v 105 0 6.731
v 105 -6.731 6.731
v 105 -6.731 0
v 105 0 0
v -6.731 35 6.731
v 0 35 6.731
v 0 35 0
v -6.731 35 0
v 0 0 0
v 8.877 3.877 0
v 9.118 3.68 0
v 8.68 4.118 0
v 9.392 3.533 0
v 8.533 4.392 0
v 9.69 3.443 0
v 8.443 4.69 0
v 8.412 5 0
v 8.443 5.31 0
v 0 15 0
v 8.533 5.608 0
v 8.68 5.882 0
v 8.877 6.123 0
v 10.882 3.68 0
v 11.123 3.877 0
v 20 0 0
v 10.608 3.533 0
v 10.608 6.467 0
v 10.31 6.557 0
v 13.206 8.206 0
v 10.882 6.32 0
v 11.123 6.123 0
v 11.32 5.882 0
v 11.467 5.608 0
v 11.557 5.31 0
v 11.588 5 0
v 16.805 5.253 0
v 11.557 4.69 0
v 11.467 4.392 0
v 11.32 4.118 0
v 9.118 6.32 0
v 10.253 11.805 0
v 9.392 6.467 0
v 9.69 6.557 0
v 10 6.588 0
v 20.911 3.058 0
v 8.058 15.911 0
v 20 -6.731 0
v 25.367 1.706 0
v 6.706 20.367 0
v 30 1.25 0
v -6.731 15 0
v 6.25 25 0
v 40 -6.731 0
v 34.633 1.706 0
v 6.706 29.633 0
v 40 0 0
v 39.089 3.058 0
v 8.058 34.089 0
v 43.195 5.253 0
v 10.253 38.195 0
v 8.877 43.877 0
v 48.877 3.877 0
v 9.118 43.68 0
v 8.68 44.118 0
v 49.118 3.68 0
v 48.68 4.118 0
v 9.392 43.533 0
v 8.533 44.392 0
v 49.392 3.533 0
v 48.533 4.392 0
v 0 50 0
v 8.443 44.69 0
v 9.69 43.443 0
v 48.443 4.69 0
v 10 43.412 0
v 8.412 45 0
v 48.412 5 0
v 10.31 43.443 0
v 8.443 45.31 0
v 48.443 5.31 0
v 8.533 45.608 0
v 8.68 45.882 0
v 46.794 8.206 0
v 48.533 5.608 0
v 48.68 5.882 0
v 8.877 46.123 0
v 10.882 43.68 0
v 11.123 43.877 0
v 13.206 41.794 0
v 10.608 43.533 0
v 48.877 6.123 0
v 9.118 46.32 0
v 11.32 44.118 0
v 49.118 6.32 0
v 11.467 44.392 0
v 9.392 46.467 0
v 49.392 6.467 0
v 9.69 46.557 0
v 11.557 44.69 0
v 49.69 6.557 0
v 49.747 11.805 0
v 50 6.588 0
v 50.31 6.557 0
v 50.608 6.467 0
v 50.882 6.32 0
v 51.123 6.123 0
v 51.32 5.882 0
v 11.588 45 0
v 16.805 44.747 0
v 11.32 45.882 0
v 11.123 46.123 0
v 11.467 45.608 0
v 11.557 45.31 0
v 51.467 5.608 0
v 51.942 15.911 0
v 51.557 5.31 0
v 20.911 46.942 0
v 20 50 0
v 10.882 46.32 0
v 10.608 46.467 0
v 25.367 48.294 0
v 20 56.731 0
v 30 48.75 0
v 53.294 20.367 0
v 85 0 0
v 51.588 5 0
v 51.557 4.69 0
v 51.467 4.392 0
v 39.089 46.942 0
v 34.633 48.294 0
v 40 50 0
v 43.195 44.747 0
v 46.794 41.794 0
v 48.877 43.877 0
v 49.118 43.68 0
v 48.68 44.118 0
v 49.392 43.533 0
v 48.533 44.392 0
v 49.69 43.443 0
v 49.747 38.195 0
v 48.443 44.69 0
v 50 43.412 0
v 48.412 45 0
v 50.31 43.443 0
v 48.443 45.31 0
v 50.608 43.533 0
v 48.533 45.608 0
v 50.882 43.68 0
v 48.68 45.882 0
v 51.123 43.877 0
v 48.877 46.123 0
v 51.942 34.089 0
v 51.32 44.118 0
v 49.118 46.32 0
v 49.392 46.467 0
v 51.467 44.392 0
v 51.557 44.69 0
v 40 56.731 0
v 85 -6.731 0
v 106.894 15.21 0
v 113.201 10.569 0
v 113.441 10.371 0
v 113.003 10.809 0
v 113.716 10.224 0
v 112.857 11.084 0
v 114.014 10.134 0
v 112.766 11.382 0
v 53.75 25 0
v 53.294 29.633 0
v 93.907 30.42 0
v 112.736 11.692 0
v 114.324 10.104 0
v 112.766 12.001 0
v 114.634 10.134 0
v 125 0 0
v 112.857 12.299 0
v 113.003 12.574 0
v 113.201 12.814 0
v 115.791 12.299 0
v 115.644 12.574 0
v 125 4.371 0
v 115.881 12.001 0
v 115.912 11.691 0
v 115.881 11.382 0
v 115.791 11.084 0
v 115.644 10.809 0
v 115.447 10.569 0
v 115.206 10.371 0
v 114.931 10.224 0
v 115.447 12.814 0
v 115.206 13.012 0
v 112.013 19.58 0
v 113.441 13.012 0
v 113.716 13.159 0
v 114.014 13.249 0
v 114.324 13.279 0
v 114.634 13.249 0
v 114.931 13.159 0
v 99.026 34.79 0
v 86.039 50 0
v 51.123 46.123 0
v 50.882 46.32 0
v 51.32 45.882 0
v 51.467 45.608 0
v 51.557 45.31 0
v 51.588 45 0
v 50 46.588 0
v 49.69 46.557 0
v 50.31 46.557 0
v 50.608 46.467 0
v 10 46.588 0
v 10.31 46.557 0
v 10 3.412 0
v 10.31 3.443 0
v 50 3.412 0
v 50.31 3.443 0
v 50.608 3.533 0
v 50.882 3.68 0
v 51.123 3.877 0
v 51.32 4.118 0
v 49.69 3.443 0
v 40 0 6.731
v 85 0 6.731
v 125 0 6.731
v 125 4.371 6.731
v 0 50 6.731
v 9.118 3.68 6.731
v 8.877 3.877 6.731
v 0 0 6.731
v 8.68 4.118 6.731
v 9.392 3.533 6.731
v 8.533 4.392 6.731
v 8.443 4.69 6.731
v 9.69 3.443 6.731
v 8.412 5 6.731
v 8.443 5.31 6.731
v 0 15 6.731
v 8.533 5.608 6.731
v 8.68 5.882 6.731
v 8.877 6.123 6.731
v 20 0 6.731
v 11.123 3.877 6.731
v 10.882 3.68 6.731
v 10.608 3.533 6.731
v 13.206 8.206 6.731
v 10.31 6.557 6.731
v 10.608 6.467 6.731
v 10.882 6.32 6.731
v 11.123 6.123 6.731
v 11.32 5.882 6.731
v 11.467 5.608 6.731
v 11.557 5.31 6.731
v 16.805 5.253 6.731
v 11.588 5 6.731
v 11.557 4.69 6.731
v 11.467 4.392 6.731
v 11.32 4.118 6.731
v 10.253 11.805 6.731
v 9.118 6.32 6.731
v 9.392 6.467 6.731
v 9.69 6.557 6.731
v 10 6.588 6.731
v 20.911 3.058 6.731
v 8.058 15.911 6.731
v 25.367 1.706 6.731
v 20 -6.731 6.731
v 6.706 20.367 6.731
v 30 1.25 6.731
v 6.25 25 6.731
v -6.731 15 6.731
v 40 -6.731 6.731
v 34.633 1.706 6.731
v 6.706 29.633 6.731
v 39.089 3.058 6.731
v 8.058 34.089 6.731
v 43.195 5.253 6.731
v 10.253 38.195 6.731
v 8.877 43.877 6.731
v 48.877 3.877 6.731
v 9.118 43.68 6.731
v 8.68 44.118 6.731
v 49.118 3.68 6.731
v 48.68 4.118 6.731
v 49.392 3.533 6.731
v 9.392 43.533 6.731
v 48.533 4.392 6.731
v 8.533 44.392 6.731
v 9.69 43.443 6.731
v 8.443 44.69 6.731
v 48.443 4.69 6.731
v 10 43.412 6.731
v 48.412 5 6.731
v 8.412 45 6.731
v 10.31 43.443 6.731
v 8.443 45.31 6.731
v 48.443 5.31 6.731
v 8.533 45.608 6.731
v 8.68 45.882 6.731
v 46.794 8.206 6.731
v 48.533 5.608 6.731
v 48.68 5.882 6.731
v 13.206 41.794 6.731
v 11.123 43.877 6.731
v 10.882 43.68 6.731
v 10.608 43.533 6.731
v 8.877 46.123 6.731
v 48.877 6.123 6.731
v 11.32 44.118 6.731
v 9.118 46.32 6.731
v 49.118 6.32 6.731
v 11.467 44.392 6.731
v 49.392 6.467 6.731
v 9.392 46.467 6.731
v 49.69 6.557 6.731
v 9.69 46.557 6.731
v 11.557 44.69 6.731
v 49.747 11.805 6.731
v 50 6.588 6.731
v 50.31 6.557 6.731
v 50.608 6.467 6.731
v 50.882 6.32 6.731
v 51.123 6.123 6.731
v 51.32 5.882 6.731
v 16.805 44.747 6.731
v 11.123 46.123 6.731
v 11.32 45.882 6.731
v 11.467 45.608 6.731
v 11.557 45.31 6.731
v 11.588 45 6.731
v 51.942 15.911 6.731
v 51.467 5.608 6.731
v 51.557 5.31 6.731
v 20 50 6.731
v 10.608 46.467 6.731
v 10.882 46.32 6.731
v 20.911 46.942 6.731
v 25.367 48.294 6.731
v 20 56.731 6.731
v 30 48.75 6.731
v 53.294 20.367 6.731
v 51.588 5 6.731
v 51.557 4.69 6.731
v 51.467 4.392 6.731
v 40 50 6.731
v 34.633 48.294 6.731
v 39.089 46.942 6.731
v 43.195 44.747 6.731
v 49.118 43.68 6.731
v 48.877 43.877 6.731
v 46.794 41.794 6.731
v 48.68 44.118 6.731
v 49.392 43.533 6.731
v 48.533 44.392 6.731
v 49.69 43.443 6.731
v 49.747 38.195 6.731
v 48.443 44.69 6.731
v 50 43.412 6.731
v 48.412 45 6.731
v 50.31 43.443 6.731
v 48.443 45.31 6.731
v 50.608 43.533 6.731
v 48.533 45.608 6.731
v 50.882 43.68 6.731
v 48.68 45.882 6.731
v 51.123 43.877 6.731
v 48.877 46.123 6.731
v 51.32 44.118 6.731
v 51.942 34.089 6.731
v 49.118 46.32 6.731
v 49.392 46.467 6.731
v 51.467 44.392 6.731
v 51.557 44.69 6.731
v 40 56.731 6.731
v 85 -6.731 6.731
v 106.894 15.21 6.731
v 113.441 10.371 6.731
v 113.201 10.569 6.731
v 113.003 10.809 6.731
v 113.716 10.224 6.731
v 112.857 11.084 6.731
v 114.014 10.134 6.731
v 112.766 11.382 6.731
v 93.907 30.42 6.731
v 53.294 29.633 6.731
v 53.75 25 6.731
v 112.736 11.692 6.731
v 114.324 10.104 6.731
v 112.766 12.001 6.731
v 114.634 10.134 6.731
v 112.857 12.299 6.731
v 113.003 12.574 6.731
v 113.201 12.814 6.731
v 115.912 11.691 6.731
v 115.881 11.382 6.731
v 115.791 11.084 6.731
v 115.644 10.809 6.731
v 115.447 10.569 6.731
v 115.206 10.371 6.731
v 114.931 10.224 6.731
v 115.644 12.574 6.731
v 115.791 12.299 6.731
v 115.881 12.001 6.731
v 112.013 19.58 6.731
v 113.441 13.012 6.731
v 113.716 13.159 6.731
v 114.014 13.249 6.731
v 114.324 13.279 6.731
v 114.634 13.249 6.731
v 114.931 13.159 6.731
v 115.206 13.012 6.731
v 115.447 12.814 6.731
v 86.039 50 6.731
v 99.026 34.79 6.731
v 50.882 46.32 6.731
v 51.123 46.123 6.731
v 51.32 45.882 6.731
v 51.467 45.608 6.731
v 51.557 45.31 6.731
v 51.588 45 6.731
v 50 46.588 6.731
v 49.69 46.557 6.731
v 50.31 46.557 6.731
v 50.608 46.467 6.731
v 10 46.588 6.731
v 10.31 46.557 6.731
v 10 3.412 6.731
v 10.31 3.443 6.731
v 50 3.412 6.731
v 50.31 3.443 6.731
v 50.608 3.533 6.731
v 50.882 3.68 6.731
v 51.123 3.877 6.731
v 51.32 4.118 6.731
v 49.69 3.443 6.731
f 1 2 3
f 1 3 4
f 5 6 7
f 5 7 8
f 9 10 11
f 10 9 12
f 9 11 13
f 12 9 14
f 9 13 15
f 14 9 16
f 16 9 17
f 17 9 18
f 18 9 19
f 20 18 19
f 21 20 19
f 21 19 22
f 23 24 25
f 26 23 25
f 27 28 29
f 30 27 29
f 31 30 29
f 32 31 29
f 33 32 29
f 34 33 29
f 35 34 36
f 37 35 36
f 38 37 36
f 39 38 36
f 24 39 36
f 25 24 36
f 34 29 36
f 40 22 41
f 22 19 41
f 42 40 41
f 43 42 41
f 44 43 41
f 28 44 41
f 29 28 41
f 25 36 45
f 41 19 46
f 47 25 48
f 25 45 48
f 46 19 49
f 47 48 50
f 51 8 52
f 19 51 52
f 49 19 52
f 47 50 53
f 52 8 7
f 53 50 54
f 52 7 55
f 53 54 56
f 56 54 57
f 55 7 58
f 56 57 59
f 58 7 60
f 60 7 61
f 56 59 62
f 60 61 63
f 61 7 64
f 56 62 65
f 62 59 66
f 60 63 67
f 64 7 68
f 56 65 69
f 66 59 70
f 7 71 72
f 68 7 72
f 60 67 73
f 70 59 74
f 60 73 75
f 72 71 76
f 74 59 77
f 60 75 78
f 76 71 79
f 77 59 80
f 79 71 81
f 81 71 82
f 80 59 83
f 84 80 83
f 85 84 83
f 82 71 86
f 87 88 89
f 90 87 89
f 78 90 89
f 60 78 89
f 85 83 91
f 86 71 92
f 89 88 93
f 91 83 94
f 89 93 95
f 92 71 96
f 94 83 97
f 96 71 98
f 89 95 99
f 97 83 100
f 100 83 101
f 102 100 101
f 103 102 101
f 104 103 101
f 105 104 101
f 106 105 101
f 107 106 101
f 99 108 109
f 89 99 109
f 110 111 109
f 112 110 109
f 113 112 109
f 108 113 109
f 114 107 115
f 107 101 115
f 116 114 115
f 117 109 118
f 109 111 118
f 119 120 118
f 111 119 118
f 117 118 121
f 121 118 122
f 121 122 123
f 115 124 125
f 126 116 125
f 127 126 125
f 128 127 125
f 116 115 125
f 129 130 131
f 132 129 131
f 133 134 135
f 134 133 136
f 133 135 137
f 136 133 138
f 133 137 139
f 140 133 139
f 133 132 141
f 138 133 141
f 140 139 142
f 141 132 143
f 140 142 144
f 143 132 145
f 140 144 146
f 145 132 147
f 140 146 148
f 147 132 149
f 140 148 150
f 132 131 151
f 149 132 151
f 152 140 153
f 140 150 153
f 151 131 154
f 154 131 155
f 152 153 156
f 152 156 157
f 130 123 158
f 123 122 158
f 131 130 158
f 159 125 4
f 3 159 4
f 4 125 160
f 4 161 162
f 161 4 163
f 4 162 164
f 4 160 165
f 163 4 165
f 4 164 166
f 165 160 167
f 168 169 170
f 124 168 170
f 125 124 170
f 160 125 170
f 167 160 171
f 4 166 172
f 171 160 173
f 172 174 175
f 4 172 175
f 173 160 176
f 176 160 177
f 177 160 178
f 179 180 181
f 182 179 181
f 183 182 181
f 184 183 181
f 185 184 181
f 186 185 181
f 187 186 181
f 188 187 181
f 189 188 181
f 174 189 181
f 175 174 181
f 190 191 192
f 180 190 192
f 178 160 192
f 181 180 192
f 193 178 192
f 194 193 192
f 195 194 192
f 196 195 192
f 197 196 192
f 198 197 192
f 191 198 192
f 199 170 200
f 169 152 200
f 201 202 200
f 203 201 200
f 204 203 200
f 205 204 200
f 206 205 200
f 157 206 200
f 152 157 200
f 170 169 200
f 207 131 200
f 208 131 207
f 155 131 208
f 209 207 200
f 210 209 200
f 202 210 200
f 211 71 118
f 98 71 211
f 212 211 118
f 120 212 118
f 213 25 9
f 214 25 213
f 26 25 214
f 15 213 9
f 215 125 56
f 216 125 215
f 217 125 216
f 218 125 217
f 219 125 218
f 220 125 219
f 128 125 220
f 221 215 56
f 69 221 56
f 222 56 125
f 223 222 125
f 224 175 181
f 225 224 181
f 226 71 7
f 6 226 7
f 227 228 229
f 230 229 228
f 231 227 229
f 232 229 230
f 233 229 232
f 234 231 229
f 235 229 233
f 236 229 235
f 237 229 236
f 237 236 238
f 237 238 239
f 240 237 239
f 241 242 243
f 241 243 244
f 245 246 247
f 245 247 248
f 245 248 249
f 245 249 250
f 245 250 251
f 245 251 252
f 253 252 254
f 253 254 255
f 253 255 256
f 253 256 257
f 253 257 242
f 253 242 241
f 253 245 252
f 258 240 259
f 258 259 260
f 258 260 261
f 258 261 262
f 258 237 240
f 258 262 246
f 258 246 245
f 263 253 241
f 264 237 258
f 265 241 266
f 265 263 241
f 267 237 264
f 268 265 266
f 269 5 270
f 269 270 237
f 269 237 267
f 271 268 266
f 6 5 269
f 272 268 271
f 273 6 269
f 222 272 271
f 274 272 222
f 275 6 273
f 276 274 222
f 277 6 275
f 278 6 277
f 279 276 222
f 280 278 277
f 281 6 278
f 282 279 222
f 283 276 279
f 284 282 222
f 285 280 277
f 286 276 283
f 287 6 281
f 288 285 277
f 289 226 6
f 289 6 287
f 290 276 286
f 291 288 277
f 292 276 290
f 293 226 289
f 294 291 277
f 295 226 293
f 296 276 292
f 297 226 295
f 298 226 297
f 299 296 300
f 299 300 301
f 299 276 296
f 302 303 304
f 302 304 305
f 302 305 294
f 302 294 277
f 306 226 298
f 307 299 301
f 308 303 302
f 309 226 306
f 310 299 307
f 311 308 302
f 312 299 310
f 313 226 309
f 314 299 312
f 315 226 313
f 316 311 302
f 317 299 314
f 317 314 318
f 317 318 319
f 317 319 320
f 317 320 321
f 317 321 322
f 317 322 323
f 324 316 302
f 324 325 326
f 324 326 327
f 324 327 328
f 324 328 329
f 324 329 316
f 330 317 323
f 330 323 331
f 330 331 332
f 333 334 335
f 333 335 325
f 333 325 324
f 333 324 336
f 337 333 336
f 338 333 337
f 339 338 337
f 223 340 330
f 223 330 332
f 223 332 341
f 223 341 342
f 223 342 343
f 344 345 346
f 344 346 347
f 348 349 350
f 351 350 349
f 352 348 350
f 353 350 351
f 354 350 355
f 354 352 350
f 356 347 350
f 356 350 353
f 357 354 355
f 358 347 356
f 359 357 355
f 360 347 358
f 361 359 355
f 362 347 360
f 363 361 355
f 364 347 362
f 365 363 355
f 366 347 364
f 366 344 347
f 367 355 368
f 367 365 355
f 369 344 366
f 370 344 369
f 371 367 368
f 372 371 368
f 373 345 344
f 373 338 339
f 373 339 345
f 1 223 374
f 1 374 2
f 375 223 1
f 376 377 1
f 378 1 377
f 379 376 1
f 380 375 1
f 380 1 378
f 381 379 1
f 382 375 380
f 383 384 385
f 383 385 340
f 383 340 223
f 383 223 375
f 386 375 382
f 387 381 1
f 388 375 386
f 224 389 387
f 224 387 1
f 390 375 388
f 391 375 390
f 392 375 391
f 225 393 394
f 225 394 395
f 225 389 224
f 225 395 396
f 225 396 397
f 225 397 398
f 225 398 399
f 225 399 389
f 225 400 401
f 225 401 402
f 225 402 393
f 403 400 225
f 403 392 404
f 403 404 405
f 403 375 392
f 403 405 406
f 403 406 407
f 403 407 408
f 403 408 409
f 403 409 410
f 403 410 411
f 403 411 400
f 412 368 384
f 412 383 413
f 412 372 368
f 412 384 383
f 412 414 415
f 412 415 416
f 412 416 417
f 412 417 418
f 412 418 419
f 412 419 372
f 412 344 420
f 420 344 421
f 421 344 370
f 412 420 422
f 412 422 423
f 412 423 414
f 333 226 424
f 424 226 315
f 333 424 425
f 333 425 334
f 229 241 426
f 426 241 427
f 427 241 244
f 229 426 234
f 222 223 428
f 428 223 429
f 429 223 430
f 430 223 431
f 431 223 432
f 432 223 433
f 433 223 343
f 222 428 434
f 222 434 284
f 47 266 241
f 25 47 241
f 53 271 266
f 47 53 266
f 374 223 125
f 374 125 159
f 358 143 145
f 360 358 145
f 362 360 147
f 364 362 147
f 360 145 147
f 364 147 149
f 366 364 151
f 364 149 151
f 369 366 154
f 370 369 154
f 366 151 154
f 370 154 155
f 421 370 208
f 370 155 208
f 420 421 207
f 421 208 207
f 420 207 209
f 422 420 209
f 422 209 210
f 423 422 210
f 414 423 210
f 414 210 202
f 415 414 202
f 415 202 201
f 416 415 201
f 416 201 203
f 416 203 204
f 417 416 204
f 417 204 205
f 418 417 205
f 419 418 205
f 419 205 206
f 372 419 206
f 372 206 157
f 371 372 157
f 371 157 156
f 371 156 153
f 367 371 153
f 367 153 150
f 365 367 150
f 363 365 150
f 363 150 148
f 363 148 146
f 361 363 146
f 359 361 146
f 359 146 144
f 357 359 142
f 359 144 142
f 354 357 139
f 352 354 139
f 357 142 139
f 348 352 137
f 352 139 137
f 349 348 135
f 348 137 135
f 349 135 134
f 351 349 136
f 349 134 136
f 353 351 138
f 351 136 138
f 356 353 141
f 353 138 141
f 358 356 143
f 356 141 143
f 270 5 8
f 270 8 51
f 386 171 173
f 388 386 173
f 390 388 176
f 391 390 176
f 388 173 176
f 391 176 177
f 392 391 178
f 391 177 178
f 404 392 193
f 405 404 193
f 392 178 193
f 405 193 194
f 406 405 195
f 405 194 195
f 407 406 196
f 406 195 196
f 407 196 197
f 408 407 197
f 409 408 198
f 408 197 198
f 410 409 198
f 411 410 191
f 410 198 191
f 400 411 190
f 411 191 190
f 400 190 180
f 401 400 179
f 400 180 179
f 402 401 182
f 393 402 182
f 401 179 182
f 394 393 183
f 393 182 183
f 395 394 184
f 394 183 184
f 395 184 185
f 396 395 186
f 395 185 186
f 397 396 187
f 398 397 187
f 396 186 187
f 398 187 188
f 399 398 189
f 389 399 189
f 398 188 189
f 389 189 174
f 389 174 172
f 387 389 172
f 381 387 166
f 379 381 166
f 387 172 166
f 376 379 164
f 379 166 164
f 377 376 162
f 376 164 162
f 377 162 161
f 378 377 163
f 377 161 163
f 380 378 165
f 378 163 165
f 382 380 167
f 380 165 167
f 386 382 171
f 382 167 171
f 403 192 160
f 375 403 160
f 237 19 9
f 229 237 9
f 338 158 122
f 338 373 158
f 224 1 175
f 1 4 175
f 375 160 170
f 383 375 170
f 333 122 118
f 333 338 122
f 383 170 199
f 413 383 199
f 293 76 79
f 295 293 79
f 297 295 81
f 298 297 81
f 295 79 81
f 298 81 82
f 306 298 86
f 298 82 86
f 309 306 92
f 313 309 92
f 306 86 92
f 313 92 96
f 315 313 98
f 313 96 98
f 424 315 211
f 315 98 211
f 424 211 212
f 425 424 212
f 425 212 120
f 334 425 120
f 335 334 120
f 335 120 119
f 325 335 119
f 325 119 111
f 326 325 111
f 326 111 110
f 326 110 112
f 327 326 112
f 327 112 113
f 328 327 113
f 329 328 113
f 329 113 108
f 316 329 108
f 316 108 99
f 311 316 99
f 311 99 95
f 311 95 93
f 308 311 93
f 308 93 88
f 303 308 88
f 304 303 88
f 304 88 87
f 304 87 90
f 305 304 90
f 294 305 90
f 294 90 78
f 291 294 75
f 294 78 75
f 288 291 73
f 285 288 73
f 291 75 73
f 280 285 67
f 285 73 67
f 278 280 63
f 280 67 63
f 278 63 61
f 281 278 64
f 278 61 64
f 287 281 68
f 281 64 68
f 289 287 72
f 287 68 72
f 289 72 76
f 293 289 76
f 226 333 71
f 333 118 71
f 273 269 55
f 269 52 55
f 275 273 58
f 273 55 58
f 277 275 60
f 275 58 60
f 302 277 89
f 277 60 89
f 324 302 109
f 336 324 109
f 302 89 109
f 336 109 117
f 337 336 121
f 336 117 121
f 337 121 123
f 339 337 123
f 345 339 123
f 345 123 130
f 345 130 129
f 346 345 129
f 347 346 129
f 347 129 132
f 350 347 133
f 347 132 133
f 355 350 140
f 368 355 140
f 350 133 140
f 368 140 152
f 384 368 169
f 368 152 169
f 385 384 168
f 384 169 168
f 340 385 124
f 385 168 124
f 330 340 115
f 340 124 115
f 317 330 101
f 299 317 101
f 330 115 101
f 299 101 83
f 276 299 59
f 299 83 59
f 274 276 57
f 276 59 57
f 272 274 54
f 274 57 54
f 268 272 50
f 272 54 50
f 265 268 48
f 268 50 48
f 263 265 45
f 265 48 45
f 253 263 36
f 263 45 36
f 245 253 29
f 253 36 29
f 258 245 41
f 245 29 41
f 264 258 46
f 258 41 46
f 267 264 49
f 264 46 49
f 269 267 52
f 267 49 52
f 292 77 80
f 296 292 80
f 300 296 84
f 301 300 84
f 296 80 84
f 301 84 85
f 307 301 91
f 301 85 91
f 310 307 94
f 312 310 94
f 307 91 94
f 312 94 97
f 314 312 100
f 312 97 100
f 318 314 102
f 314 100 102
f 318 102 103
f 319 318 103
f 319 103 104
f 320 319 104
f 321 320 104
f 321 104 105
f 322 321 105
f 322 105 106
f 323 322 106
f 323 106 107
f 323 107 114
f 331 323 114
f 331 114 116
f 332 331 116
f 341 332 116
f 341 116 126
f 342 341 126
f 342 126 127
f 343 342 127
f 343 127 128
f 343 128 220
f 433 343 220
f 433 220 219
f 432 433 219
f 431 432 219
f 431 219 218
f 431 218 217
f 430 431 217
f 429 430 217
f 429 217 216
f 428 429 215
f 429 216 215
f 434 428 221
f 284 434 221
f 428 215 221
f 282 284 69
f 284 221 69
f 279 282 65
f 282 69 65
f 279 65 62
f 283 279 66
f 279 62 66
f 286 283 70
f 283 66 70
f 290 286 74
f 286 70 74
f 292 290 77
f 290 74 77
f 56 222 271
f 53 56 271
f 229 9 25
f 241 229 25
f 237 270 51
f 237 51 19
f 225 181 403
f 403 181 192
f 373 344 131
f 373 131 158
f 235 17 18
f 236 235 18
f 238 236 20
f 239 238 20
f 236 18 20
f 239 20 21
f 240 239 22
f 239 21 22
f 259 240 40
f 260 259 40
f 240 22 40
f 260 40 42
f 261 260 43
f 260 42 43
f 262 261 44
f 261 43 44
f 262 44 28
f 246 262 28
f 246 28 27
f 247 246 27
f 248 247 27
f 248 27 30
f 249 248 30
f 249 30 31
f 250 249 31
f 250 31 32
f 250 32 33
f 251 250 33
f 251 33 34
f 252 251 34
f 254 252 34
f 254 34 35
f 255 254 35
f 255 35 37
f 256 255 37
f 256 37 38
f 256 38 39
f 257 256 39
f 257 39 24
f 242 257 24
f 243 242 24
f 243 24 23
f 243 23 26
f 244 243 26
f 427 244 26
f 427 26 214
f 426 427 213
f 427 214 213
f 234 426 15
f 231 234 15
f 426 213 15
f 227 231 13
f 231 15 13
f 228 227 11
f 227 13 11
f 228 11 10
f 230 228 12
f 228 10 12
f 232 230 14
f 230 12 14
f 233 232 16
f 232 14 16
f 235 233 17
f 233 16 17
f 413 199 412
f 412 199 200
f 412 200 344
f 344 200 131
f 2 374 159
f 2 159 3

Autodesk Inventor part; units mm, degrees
ref_plane "YZ Plane" through (0, 0, 0) normal (1, 0, 0) x (0, 1, 0)
ref_plane "XZ Plane" through (0, 0, 0) normal (0, 1, 0) x (-1, 0, 0)
ref_plane "XY Plane" through (0, 0, 0) normal (0, 0, 1) x (1, 0, 0)
sketch "Sketch1" plane through (0, 0, 0) normal (0, 0, 1) x (1, 0, 0)
  line L0 (0, 0) -> (125, 0)
  line L1 (125, 0) -> (125, 50)
  line L2 (125, 50) -> (0, 50)
  line L3 (0, 50) -> (0, 0)
  dimension "d0" = 125
  dimension "d1" = 50
extrude "Extrusion1" add sketch "Sketch1" along normal blind 6.731
sketch "Sketch4" plane through (0, 0, 0) normal (0, 0, -1) x (-1, 0, 0)
  line L0 (-125, 50) -> (0, 50) projected
  line L1 (-125, 0) -> (-125, 50) projected
  line L2 (-125, 4.3708) -> (-86.0388, 50)
  line L3 (-112.0129, 19.5805) -> (-106.8941, 15.2097)
  line L4 (-106.8941, 15.2097) -> (-93.907, 30.4195)
  line L5 (-93.907, 30.4195) -> (-99.0259, 34.7903)
  line L6 (0, 0) -> (-125, 0) projected
  line L7 (-125, 4.3708) -> (-119.8812, 0)
  circle A0 centre (-114.3237, 11.6915) radius 1.588
  dimension "d25" = 6.731
  dimension "d26" = 20
  dimension "d27" = 20
  dimension "d28" = 6.731
  dimension "d29" = 3.176
  dimension "d30" = 3.3655
  dimension "d31" = 7.5
  dimension "d40" = 60
extrude "LCD_Cut" cut sketch "Sketch4" against normal up to next contours L0 L2 L1 | L5 L4 L3 L2 | A0
sketch "Sketch2" plane through (0, 0, 6.731) normal (0, 0, 1) x (1, 0, 0)
  line L0 (0, 0) -> (125, 0) projected
  line L1 (125, 0) -> (125, 50) projected
  line L2 (0, 50) -> (0, 0) projected
  line L3 (20, 0) -> (40, 0)
  line L4 (40, 0) -> (40, -6.731)
  line L5 (40, -6.731) -> (20, -6.731)
  line L6 (20, -6.731) -> (20, 0)
  line L7 (105, 0) -> (85, 0)
  line L8 (85, 0) -> (85, -6.731)
  line L9 (85, -6.731) -> (105, -6.731)
  line L10 (105, -6.731) -> (105, 0)
  line L11 (0, 35) -> (-6.731, 35)
  line L12 (-6.731, 35) -> (-6.731, 15)
  line L13 (-6.731, 15) -> (0, 15)
  line L14 (0, 15) -> (0, 35)
  line L15 (86.0388, 50) -> (0, 50) projected
  line L16 (20, 50) -> (40, 50)
  line L17 (40, 50) -> (40, 56.731)
  line L18 (40, 56.731) -> (20, 56.731)
  line L19 (20, 56.731) -> (20, 50)
  point P0 (-6.731, 25)
  point P1 (0, 25)
  dimension "d4" = 6.731
  dimension "d5" = 20
  dimension "d6" = 20
  dimension "d7" = 20
extrude "Tabs Pos" add sketch "Sketch2" against normal blind 6.731
sketch "Sketch3" plane through (0, 0, 0) normal (0, 0, -1) x (-1, 0, 0)
  line L0 (0, 50) -> (0, 0) projected
  line L1 (-86.0388, 50) -> (0, 50) projected
  line L2 (-20, -6.731) -> (-20, 0) projected
  circle A0 centre (-50, 45) radius 1.588
  circle A1 centre (-10, 45) radius 1.588
  circle A2 centre (-10, 5) radius 1.588
  circle A3 centre (-50, 5) radius 1.588
  line L3 (-50, 45) -> (-50, 5) construction
  line L4 (-10, 45) -> (-50, 45) construction
  line L5 (-50, 5) -> (-10, 45) construction
  circle A4 centre (-30, 25) radius 23.75
  point P0 (-150, 55)
  dimension "d10" = 3.176
  dimension "d11" = 40
  dimension "d12" = 5
  dimension "d13" = 50
  dimension "d14" = 10
  dimension "d15" = 47.5
extrude "Fan" cut sketch "Sketch3" against normal up to next
equation "\"d2\" = THICKB"
equation "\"d25\" = THICKB"
equation "\"d28\" = THICKB"
equation "\"d30\" = 0.5 * THICKB"
equation "\"d4\" = THICKB"
equation "\"d8\" = THICKB"
equation "\"d12\" = -0.5 * d11 + 0.5 * d13"
equation "\"THICKA\" = 3.175"
equation "\"THICKB\" = 6.731"
equation "\"THICKC\" = 12.7"
equation "\"THICKPLY\" = 5"
equation "\"MAGDIA\" = 9.5"
equation "\"BALLDIA\" = 12"
properties part number "Controller_Side_A"
